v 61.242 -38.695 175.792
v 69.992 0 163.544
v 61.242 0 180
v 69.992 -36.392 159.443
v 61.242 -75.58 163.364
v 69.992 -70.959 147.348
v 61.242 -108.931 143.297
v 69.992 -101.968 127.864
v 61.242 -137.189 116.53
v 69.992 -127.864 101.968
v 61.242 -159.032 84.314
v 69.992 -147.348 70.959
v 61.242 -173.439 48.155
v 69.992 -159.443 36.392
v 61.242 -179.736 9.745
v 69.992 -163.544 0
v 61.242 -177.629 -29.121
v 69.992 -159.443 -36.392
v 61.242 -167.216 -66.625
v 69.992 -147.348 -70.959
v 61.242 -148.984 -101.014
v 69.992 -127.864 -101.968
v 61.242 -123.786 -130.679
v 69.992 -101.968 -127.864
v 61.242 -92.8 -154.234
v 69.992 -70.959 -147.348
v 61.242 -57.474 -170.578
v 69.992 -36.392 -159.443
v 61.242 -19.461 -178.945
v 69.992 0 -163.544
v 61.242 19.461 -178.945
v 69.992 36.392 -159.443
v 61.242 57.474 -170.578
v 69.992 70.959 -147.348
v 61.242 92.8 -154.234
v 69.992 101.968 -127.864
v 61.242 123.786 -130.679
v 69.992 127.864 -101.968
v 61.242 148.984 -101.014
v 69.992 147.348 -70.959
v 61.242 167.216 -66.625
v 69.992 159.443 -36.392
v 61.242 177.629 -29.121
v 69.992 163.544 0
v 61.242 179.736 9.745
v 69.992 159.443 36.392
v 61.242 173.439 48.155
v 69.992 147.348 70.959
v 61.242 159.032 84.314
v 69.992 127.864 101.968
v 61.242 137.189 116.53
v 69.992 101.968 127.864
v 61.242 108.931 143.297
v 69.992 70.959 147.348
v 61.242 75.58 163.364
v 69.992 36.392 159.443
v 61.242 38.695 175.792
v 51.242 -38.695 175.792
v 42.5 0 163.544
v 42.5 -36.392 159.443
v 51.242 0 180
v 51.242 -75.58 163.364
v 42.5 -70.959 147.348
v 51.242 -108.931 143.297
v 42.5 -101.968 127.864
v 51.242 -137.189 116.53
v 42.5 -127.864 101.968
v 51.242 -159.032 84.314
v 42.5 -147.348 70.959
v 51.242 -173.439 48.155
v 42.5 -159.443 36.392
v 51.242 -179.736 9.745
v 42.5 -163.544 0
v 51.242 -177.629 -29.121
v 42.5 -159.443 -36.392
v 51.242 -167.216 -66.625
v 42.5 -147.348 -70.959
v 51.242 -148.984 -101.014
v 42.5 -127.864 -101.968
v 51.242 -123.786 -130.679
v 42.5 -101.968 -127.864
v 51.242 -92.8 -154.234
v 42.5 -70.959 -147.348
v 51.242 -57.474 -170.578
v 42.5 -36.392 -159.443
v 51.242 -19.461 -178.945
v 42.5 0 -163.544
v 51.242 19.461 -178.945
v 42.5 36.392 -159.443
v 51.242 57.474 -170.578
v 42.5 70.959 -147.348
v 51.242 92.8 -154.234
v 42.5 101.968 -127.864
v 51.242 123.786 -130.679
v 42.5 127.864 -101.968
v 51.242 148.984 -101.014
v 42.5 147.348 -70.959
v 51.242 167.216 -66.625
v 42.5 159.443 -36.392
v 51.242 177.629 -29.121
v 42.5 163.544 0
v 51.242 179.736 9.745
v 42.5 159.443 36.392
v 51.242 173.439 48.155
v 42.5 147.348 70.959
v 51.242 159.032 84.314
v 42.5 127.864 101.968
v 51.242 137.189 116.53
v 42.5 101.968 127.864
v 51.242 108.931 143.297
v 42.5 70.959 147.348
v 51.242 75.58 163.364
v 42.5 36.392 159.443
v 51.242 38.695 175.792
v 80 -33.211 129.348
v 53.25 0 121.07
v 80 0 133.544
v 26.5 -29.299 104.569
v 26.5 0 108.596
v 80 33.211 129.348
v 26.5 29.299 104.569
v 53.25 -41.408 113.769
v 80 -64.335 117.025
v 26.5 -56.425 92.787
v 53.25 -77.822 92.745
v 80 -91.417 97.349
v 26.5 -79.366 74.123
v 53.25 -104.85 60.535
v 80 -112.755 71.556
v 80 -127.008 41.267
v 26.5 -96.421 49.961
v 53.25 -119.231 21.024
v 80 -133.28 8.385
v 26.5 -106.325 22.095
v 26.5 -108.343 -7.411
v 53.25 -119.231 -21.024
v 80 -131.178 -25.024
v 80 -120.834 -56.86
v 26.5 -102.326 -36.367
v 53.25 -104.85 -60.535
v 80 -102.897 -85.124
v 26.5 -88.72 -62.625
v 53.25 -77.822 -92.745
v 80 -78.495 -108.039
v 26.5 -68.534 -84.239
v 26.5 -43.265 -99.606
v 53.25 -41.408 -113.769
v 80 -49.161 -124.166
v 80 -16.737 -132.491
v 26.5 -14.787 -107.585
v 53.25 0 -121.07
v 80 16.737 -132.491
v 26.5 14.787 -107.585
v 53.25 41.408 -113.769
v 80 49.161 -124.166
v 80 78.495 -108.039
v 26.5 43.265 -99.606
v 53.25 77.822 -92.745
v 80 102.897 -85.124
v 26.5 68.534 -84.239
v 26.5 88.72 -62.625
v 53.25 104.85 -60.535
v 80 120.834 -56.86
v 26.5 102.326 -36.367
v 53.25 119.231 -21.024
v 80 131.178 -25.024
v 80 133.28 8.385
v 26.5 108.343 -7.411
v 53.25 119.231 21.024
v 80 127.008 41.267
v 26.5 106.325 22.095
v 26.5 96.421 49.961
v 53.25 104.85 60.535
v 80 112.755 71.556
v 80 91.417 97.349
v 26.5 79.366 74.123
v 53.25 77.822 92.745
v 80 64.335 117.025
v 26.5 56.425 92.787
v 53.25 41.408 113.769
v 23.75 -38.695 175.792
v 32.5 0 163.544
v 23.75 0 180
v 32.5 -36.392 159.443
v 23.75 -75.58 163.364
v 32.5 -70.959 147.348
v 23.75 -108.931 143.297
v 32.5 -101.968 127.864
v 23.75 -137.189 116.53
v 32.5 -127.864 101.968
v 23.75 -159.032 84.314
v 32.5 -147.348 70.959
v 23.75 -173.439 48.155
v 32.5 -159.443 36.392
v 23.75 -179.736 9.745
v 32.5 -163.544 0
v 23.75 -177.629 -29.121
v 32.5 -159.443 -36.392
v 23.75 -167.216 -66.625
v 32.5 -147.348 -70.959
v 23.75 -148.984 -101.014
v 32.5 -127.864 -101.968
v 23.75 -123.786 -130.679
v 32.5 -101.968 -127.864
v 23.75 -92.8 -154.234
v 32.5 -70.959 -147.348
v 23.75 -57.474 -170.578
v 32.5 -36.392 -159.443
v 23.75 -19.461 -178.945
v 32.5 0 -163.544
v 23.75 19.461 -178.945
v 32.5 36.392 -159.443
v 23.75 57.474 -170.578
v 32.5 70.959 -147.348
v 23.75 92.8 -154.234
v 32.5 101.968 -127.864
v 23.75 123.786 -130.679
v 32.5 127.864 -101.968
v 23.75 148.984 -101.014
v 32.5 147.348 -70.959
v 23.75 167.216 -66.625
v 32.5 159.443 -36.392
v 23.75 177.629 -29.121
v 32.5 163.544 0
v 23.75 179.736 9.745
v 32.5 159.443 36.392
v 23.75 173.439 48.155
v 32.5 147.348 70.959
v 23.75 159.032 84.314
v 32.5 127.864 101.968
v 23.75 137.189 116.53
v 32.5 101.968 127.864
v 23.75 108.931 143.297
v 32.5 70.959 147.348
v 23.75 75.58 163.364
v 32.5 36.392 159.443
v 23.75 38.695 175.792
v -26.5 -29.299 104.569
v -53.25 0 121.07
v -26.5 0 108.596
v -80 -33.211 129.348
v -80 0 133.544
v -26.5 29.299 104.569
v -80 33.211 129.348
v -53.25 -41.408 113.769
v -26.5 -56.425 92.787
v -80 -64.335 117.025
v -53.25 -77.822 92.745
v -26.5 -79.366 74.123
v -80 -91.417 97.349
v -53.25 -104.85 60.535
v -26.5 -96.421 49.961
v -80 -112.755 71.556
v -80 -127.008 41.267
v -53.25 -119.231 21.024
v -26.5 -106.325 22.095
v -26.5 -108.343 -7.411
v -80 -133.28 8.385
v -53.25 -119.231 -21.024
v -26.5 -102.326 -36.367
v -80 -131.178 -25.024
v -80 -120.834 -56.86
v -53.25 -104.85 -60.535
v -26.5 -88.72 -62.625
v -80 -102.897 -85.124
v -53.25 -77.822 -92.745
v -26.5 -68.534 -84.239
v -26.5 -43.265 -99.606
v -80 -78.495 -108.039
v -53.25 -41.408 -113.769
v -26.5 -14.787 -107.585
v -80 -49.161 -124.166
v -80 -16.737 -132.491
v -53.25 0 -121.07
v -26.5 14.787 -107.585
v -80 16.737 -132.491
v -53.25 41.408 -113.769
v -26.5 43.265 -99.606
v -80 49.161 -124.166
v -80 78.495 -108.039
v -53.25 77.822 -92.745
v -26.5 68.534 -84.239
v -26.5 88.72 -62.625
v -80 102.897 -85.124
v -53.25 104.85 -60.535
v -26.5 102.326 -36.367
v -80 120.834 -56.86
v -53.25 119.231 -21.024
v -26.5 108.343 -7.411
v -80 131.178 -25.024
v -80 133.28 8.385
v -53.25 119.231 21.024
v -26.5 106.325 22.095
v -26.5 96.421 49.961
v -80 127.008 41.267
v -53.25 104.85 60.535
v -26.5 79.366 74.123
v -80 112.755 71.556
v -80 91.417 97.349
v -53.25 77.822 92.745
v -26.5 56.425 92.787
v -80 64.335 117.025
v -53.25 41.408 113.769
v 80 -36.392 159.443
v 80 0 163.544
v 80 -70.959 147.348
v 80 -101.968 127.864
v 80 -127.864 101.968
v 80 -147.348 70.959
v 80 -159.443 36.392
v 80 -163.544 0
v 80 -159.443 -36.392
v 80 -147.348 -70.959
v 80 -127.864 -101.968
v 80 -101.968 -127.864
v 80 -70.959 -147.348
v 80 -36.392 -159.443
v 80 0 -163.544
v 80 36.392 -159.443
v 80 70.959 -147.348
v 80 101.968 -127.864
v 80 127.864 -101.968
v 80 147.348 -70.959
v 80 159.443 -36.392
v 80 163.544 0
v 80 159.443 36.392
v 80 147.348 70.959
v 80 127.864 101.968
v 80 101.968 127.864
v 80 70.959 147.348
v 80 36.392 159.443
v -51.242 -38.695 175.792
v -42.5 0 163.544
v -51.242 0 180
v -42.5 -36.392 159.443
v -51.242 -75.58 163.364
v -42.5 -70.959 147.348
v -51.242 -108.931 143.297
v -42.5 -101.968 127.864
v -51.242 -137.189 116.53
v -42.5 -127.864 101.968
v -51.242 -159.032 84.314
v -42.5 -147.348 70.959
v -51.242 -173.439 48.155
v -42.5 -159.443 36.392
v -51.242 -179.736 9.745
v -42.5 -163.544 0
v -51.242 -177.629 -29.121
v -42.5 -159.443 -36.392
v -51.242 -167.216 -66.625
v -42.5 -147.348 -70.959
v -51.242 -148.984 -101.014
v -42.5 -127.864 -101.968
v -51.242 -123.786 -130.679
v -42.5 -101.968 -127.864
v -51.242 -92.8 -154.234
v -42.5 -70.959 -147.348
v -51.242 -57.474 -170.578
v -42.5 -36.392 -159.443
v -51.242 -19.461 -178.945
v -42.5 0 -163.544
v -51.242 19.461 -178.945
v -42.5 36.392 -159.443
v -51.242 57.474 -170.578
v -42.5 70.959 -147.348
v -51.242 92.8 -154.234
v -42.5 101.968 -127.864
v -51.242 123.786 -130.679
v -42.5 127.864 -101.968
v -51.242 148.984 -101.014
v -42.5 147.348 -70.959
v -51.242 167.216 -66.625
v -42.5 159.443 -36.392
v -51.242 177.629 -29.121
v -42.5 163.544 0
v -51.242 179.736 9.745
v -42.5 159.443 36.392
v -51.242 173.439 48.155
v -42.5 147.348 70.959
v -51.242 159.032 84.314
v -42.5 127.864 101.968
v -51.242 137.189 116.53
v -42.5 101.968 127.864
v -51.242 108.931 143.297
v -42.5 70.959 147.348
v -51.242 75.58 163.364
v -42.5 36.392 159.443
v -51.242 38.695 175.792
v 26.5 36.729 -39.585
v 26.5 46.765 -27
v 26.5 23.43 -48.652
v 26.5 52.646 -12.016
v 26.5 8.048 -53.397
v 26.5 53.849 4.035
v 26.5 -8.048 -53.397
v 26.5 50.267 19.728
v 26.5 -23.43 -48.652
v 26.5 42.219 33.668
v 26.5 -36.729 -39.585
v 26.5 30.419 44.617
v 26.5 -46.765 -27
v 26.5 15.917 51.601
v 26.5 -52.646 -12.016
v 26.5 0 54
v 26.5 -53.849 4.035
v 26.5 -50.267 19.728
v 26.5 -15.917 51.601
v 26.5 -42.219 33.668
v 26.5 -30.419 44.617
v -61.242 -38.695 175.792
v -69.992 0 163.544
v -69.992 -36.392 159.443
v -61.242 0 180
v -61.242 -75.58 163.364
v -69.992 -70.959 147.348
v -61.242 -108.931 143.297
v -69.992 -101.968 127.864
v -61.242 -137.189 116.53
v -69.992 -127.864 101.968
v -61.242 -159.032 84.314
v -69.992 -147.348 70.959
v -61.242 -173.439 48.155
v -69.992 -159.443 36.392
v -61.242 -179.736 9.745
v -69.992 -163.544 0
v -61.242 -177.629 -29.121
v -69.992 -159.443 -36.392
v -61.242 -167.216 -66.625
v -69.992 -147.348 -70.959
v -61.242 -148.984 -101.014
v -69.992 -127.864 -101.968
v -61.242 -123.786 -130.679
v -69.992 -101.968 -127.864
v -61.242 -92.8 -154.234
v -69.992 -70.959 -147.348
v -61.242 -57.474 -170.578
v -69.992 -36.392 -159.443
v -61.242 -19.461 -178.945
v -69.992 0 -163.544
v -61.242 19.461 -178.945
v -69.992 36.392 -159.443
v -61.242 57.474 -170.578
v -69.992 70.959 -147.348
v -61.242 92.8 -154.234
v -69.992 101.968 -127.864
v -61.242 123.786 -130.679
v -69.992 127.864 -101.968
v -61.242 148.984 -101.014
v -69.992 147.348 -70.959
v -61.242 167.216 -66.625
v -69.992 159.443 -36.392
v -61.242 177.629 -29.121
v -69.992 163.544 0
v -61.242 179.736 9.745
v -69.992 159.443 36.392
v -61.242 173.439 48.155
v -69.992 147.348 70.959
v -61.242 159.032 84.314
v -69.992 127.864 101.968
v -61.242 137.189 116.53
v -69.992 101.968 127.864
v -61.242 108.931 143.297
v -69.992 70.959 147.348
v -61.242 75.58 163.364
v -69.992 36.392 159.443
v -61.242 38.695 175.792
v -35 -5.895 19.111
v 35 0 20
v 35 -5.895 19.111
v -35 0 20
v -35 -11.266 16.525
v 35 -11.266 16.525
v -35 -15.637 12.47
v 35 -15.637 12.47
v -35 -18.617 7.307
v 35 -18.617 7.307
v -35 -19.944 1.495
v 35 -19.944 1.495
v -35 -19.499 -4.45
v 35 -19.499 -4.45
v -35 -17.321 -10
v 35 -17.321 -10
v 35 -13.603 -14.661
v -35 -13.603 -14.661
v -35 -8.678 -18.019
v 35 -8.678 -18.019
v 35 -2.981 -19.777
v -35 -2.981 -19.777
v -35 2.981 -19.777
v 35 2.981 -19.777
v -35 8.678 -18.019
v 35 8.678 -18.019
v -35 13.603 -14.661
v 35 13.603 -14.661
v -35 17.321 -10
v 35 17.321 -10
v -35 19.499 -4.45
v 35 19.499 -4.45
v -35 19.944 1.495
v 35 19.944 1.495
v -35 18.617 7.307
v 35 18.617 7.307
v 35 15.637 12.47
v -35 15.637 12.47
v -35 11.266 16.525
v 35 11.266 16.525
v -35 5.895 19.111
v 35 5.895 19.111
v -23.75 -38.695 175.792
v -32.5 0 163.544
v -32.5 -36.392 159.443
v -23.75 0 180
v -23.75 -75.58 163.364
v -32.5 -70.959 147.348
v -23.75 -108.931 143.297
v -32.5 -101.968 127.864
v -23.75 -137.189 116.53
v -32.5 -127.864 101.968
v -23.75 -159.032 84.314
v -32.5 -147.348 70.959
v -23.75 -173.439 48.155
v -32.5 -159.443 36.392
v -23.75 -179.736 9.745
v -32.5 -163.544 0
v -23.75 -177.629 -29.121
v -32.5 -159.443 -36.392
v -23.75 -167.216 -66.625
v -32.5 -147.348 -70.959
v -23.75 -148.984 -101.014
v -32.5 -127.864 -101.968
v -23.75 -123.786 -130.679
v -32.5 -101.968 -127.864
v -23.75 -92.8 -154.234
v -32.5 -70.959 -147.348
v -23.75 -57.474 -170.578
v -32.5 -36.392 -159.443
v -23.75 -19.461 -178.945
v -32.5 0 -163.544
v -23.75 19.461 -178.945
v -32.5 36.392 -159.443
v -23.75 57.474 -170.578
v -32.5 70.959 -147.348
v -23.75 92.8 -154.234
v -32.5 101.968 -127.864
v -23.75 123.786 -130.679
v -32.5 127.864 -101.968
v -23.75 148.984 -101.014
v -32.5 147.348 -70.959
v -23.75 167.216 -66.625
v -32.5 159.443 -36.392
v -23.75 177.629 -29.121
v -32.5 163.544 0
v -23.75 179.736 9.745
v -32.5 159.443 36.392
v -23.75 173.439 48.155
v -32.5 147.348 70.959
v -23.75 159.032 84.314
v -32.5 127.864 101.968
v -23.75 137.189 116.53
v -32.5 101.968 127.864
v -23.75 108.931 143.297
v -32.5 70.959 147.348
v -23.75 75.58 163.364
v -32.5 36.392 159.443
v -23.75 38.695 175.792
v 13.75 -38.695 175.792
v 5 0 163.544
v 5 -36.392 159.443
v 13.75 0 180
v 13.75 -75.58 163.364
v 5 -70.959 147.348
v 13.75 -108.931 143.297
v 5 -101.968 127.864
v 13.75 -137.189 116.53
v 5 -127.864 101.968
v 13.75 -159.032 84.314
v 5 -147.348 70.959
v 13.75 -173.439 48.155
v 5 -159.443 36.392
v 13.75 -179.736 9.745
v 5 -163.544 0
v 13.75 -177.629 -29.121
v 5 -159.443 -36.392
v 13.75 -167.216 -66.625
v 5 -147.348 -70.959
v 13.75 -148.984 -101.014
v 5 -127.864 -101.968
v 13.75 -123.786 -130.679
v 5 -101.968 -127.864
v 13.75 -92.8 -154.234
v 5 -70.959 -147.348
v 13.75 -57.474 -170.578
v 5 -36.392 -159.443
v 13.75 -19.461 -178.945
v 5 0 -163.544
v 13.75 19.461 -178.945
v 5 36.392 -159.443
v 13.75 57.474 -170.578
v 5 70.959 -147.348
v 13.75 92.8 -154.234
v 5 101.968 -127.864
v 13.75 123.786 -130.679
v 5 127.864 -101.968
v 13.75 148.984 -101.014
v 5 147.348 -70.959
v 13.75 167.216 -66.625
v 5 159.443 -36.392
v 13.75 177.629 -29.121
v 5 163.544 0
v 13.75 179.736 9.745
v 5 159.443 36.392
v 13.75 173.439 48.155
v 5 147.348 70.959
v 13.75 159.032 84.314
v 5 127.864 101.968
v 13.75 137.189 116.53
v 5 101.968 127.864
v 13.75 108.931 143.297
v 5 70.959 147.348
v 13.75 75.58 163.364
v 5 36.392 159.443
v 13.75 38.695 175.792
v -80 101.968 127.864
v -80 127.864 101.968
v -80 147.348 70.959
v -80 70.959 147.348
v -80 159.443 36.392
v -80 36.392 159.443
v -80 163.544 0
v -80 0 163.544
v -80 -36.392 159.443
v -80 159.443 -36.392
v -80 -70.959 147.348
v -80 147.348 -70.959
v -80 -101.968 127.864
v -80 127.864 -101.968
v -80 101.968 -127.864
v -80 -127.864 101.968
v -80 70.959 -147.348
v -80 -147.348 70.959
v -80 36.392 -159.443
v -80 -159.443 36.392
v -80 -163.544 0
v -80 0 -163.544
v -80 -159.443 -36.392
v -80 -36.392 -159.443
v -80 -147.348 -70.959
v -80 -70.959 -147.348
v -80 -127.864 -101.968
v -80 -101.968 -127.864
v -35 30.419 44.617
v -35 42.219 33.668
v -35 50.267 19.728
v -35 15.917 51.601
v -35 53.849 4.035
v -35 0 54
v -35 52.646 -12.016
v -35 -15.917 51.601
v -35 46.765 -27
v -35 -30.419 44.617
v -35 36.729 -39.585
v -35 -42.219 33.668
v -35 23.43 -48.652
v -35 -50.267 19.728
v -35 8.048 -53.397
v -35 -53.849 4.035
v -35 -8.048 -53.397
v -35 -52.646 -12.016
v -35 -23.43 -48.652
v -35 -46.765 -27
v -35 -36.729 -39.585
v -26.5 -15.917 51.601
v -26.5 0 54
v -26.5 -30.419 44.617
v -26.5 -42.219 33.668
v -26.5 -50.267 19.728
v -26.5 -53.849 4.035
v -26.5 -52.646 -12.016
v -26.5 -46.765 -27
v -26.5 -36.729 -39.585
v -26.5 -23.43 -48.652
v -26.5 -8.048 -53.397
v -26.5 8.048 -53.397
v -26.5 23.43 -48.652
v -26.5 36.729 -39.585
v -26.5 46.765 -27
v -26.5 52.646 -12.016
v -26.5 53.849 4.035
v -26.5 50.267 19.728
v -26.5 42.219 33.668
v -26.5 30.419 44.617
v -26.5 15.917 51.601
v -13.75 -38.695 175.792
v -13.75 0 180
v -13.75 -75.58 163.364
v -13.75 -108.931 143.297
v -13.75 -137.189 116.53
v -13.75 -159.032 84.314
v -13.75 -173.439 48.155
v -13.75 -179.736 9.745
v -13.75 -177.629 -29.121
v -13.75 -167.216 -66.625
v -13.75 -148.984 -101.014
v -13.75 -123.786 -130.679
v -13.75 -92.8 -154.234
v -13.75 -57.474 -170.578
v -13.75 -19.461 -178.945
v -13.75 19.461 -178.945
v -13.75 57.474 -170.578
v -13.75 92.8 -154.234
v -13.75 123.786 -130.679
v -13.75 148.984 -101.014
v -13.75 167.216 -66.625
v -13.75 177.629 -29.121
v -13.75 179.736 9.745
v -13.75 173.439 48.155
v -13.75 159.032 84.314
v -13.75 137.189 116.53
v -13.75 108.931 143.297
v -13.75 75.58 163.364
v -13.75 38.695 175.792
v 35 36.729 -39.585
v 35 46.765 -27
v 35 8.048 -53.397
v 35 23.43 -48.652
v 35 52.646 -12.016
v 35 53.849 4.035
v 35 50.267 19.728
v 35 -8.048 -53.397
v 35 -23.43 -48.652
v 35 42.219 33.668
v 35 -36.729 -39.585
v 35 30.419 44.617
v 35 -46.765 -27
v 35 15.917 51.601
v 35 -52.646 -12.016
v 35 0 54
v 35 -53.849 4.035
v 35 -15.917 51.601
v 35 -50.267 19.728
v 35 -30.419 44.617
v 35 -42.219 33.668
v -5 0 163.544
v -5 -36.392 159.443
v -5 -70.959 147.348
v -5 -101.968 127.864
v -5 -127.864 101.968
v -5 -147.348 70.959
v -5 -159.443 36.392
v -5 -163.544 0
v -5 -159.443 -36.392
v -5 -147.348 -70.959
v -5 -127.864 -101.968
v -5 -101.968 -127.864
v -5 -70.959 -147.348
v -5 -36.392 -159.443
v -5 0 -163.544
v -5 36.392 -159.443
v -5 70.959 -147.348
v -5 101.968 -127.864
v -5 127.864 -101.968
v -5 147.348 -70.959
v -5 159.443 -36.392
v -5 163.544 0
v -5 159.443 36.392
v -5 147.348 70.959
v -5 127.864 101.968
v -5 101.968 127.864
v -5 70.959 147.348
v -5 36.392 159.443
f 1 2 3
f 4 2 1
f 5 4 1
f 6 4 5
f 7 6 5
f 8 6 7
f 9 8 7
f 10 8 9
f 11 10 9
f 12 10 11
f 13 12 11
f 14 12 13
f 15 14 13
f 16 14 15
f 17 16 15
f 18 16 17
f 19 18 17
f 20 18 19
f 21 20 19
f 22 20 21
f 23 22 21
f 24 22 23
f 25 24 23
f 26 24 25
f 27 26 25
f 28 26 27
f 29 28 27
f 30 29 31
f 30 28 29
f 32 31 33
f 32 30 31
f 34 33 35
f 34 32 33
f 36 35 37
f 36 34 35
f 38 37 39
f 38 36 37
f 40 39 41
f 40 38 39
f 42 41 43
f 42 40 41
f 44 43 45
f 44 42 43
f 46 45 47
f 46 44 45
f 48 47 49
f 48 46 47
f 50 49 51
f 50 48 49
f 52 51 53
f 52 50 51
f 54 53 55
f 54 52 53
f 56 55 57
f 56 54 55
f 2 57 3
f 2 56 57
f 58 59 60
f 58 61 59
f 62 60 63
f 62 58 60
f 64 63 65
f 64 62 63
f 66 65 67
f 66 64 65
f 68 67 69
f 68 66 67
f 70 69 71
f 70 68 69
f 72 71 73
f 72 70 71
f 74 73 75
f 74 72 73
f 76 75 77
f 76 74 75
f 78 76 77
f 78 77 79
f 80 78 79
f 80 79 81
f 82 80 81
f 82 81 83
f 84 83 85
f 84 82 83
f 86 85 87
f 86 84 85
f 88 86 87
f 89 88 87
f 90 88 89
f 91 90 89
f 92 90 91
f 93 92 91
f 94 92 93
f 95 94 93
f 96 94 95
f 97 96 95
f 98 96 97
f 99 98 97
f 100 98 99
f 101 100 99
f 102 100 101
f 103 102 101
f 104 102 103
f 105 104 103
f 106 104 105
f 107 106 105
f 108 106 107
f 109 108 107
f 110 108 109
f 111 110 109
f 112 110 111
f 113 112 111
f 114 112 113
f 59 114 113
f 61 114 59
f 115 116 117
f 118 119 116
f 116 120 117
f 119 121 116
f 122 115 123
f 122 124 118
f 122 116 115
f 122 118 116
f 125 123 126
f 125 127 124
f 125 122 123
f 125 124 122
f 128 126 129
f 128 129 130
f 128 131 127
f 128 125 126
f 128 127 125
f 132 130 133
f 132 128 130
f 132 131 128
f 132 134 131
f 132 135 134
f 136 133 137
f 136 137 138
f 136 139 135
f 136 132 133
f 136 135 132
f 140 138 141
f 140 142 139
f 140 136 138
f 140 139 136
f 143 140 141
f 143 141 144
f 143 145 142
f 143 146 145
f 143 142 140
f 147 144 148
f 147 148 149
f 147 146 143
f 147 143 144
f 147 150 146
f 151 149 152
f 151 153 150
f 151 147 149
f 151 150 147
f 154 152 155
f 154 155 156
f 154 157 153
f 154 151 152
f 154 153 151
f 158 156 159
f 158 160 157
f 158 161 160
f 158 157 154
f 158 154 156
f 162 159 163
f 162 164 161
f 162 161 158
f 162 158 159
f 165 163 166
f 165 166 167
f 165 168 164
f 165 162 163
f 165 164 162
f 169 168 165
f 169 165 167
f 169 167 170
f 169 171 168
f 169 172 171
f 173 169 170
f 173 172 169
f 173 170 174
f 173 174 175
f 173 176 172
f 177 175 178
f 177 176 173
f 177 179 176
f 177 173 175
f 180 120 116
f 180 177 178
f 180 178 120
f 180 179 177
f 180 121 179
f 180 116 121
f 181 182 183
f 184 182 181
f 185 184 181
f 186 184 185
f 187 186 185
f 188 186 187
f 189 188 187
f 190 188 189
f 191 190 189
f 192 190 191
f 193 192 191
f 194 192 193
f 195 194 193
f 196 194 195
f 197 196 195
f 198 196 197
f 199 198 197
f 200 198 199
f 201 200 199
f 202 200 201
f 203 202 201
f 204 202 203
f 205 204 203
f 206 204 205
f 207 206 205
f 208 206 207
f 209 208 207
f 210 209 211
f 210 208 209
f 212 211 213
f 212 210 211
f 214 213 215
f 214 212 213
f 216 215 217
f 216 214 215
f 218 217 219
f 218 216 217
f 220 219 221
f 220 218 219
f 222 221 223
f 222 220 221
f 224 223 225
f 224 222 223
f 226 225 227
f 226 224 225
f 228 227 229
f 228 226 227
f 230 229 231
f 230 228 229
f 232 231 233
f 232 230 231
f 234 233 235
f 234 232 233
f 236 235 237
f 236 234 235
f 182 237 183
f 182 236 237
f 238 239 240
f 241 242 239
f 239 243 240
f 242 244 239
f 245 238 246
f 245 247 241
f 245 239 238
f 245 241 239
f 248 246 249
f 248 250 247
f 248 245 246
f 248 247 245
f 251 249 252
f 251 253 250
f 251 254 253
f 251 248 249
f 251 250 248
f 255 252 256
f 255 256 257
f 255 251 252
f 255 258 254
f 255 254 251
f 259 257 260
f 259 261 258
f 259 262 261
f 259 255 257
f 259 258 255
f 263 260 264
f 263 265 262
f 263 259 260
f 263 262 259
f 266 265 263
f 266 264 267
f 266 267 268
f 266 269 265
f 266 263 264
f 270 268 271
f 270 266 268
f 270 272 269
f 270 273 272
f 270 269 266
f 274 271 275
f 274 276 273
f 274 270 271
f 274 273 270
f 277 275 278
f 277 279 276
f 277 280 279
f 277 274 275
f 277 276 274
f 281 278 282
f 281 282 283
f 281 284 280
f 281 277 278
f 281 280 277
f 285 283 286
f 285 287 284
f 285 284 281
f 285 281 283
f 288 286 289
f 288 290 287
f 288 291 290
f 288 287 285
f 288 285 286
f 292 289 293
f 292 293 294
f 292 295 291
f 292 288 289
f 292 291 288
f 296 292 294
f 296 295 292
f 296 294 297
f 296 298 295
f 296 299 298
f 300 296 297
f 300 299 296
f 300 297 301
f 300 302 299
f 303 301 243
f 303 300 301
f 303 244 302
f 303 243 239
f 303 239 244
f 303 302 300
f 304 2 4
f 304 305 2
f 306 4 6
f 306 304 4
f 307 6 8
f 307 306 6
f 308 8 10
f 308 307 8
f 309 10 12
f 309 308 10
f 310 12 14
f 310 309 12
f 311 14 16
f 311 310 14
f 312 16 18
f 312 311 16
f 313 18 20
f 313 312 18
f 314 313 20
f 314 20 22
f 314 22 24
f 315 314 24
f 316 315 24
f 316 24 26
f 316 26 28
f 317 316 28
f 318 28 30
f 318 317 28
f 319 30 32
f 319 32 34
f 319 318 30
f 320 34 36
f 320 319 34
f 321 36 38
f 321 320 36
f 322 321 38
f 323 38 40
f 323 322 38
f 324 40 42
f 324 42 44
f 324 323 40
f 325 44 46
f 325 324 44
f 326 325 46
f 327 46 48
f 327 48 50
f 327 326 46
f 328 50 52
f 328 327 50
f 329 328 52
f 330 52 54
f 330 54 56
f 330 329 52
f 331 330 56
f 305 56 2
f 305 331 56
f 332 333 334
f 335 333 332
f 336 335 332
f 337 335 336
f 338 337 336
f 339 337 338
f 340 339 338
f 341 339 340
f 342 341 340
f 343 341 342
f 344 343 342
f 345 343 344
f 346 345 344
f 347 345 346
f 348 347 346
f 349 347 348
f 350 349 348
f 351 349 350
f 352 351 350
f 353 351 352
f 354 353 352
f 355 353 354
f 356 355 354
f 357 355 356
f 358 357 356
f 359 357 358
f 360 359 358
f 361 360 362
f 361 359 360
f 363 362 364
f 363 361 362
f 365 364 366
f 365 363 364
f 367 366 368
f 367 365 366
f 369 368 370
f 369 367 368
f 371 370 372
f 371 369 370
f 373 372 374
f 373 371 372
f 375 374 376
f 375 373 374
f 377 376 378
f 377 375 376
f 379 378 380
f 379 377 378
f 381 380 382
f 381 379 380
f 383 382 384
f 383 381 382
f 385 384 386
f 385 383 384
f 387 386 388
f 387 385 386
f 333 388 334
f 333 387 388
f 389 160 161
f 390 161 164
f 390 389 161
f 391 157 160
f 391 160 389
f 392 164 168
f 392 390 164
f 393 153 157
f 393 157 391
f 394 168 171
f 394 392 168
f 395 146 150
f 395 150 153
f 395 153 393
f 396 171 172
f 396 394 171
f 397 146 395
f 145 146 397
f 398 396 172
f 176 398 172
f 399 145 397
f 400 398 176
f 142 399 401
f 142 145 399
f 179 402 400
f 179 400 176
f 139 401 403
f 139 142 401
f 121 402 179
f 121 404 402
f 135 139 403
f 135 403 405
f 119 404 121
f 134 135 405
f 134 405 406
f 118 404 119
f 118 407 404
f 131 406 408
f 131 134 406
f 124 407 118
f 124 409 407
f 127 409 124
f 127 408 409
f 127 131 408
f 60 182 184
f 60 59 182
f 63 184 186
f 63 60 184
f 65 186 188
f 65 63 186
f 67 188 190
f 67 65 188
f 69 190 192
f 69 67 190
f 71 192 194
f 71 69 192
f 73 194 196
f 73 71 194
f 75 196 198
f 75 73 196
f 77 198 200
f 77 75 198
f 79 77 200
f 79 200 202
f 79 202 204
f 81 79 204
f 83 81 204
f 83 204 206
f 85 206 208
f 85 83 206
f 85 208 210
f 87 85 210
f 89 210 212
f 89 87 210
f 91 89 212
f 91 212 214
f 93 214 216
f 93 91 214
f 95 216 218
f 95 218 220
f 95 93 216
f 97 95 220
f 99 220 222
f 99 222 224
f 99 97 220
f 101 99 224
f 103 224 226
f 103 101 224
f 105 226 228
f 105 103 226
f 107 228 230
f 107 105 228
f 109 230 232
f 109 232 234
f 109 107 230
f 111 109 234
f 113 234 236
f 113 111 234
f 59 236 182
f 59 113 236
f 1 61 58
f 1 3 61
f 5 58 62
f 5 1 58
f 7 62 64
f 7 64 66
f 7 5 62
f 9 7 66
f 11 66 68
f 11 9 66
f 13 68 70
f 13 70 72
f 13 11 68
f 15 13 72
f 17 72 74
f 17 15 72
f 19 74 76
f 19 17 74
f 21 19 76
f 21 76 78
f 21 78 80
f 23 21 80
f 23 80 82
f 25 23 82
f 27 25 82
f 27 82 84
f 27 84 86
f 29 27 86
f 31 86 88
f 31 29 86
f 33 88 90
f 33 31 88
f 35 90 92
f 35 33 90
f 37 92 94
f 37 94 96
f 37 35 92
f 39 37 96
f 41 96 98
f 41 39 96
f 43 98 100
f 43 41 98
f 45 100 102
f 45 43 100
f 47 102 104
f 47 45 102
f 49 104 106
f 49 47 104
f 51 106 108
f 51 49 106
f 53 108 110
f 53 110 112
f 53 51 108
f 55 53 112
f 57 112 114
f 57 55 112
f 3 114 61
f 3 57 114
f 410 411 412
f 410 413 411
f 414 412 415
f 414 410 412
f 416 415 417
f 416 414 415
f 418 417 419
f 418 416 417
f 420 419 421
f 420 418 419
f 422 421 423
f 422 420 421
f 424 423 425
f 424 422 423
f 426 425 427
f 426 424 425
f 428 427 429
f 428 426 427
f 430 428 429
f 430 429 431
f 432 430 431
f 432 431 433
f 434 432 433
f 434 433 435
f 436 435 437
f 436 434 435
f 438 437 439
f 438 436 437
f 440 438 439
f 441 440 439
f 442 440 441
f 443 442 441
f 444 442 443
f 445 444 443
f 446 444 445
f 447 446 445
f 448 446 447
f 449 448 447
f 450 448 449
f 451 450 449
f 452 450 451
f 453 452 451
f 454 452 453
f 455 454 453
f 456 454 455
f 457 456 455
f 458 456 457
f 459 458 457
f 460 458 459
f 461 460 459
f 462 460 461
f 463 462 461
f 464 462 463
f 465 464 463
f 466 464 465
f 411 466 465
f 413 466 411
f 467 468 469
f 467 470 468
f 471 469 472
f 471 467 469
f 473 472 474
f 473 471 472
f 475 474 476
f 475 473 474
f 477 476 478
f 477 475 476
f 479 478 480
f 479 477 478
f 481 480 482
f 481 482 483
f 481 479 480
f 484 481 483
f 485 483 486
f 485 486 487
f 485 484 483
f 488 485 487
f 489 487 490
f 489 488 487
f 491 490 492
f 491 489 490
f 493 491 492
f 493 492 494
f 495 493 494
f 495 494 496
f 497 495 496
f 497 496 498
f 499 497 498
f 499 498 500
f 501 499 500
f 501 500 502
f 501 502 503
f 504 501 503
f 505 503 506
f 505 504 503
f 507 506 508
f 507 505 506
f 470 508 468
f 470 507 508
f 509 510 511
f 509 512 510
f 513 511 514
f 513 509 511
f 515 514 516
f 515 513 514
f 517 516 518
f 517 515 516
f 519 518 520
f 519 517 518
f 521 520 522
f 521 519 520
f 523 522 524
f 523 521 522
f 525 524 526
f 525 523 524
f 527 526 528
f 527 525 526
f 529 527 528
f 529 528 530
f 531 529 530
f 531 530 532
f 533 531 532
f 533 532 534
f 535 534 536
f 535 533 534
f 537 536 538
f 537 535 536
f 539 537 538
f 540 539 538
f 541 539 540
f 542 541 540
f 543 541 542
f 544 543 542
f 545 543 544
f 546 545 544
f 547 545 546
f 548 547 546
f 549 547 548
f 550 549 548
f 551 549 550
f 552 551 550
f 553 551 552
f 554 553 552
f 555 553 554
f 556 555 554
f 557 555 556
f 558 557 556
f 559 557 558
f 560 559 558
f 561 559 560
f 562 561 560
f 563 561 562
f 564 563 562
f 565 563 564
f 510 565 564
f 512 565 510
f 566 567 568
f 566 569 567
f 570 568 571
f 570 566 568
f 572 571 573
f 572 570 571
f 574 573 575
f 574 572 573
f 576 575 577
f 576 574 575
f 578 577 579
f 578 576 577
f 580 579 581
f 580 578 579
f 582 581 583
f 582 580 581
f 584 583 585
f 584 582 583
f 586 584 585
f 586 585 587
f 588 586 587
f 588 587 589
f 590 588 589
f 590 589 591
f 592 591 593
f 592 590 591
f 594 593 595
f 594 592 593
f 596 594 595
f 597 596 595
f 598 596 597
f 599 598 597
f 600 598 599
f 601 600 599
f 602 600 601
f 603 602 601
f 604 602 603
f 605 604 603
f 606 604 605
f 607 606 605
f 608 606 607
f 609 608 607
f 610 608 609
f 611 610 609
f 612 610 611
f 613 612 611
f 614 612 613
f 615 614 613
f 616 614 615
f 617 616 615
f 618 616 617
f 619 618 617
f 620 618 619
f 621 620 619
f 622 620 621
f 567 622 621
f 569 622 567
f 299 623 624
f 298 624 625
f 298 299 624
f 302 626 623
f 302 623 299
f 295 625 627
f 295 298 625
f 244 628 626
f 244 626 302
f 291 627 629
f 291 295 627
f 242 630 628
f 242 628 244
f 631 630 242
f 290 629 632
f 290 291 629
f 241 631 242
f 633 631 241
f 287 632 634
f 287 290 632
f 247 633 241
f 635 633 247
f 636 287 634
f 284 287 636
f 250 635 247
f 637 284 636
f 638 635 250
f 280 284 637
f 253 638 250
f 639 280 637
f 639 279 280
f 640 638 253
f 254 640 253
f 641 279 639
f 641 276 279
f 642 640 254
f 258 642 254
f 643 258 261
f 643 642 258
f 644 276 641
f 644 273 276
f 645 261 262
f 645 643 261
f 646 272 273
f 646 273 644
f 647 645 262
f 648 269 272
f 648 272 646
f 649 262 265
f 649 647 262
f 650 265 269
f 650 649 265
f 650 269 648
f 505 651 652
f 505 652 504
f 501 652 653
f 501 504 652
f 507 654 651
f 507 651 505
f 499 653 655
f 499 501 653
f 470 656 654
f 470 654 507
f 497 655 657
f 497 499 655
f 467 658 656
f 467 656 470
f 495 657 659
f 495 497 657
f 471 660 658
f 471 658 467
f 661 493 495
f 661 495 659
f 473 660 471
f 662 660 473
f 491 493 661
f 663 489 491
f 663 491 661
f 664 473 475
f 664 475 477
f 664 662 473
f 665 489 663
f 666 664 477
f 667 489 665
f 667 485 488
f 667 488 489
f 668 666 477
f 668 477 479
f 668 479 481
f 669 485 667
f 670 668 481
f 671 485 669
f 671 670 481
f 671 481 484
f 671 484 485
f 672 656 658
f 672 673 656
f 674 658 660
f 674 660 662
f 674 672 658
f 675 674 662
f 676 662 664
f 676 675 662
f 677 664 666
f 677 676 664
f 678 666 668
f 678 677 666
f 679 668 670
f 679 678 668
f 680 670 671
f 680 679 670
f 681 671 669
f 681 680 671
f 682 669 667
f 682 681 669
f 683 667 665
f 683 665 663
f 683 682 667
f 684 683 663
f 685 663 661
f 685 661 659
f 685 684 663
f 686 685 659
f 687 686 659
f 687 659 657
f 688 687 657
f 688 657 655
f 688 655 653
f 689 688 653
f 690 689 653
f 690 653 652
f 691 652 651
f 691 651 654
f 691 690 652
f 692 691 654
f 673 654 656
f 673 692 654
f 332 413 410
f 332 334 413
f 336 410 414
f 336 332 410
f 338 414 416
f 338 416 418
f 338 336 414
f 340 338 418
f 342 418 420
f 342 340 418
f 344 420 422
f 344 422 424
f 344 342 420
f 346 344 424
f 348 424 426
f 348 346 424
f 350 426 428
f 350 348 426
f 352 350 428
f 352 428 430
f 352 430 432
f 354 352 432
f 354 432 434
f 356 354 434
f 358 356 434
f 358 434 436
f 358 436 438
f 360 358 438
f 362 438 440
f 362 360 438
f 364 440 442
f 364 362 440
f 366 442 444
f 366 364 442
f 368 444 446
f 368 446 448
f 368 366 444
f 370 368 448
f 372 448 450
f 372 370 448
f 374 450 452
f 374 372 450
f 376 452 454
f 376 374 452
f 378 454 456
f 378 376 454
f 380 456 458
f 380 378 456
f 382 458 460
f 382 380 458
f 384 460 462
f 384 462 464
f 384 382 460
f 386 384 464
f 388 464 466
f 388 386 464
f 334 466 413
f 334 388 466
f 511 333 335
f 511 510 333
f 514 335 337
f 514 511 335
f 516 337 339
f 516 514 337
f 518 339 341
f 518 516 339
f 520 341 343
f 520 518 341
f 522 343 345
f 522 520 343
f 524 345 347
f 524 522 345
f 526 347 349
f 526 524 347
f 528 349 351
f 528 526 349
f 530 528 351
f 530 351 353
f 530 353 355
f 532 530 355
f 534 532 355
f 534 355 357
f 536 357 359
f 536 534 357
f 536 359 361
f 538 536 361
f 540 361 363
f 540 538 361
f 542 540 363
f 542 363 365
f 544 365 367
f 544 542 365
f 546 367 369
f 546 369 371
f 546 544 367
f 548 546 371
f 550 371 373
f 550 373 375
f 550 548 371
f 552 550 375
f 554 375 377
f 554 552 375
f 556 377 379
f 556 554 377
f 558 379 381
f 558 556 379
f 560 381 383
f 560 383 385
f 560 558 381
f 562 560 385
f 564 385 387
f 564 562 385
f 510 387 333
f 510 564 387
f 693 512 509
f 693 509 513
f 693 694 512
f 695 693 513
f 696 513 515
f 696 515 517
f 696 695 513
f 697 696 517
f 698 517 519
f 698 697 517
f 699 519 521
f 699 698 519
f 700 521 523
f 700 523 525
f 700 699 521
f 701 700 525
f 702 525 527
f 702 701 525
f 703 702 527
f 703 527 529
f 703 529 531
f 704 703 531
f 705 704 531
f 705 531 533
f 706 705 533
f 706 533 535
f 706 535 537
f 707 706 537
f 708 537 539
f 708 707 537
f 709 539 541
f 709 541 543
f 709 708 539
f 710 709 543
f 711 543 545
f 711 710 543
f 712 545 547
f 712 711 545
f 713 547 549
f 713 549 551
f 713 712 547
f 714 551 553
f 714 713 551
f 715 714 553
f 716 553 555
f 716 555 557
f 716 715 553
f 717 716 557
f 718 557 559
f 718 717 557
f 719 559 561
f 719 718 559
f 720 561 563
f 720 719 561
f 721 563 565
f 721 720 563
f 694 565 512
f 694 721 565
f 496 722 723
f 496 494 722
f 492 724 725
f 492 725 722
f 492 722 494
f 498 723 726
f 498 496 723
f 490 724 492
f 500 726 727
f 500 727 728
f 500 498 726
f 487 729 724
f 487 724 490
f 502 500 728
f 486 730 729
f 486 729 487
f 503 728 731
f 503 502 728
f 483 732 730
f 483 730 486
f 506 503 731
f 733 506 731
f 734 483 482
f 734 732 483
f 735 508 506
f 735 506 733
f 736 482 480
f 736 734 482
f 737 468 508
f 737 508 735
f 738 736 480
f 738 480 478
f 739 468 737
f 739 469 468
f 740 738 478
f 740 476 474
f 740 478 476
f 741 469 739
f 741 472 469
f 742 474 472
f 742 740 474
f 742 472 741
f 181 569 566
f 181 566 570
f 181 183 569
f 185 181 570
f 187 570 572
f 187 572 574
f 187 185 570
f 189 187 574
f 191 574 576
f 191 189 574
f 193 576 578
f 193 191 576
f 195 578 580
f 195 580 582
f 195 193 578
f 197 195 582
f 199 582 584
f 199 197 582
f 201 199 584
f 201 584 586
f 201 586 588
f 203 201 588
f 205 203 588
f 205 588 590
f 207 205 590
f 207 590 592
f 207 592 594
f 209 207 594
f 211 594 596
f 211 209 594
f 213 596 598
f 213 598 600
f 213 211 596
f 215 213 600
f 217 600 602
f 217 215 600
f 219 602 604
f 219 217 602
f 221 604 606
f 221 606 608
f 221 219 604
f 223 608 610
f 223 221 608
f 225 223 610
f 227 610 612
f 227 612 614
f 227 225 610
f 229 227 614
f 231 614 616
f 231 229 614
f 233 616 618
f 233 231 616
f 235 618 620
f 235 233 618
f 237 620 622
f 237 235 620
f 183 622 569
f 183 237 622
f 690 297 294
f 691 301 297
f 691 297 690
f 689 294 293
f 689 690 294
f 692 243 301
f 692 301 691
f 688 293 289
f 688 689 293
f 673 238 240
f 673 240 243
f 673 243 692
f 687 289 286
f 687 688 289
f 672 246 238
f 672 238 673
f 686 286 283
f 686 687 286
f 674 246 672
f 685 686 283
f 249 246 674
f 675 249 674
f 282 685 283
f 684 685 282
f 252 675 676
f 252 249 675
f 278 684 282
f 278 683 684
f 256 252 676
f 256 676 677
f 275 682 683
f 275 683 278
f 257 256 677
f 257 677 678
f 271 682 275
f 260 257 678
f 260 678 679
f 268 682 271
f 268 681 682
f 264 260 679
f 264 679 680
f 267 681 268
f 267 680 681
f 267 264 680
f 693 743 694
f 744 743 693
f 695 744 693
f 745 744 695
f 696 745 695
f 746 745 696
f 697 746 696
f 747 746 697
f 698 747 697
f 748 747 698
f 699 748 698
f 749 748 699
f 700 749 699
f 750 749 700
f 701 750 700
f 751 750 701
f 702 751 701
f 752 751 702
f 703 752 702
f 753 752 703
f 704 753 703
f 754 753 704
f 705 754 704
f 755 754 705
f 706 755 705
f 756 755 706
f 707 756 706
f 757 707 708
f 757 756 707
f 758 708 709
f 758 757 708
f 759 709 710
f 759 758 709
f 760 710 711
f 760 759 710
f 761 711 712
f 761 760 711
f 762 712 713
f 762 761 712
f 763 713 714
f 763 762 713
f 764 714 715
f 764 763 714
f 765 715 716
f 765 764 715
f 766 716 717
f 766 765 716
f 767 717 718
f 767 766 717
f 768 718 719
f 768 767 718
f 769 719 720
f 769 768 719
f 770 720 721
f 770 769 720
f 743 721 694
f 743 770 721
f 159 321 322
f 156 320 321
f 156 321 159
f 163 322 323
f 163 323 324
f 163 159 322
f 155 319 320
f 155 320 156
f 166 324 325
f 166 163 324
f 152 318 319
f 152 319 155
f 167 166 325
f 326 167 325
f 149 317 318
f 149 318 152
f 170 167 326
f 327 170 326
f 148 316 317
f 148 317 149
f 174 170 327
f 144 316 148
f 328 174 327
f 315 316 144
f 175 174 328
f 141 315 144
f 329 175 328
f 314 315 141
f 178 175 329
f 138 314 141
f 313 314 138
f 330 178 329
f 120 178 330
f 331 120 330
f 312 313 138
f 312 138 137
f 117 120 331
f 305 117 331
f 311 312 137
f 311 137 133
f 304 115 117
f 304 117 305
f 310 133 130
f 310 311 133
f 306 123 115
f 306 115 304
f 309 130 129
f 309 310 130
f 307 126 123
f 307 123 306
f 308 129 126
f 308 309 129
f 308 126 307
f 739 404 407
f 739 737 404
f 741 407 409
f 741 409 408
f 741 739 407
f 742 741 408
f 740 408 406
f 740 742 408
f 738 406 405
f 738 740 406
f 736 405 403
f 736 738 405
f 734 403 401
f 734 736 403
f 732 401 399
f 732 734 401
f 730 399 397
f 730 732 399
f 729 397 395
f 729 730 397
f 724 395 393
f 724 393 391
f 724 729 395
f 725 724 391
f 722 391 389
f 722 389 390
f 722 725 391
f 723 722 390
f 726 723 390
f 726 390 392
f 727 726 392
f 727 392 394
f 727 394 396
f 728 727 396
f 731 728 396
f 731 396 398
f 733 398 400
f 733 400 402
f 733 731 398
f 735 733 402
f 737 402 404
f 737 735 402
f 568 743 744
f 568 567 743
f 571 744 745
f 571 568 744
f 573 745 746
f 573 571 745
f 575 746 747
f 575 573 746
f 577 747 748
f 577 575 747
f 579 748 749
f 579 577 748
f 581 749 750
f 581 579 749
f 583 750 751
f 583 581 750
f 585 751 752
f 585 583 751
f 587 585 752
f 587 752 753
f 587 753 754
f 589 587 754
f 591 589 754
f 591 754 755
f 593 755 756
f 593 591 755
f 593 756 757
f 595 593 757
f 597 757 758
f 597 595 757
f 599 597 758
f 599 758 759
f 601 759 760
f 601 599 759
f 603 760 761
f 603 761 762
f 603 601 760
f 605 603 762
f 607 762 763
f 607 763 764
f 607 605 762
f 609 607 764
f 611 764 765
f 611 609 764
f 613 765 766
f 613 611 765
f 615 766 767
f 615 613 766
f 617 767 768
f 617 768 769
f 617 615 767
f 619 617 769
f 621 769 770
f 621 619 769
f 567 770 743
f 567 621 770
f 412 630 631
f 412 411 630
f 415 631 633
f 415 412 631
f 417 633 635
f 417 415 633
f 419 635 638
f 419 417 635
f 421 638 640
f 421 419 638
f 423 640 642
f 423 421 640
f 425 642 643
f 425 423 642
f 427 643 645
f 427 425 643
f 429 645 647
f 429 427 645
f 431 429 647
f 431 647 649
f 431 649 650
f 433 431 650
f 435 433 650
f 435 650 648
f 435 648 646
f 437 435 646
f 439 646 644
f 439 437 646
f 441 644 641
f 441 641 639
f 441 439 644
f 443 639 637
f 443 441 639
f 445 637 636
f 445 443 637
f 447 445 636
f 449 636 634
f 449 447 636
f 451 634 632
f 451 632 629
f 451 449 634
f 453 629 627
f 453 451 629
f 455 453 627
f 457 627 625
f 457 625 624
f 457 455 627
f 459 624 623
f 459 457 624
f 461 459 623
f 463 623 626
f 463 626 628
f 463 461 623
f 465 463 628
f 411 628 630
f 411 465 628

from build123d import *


with BuildPart() as part:
    # Sketch1 → Revolve2 (revolve)
    with BuildSketch(Plane.XY, mode=Mode.PRIVATE) as revolve2_sk:
        Polygon((-35, 20), (-35, 54), (-26.5, 54), (-26.5, 108.596183719), (-80, 133.54364343), (-80, 163.54364343), (-69.991642542, 163.54364343), (-61.241642543, 180), (-51.241642542, 180), (-42.500000003, 163.54364343), (-32.500000001, 163.54364343), (-23.750000002, 180), (-13.75, 180), (-5.000000001, 163.54364343), (5.000000001, 163.54364343), (13.75, 180), (23.750000002, 180), (32.500000001, 163.54364343), (42.500000003, 163.54364343), (51.241642542, 180), (61.241642543, 180), (69.991642542, 163.54364343), (80, 163.54364343), (80, 133.54364343), (26.5, 108.596183719), (26.5, 54), (35, 54), (35, 20), align=None)
    revolve(revolve2_sk.sketch.rotate(Axis((-35, 0, 0), (1, 0, 0)), 90), axis=Axis((-35, 0, 0), (1, 0, 0)))


solid = part.part
